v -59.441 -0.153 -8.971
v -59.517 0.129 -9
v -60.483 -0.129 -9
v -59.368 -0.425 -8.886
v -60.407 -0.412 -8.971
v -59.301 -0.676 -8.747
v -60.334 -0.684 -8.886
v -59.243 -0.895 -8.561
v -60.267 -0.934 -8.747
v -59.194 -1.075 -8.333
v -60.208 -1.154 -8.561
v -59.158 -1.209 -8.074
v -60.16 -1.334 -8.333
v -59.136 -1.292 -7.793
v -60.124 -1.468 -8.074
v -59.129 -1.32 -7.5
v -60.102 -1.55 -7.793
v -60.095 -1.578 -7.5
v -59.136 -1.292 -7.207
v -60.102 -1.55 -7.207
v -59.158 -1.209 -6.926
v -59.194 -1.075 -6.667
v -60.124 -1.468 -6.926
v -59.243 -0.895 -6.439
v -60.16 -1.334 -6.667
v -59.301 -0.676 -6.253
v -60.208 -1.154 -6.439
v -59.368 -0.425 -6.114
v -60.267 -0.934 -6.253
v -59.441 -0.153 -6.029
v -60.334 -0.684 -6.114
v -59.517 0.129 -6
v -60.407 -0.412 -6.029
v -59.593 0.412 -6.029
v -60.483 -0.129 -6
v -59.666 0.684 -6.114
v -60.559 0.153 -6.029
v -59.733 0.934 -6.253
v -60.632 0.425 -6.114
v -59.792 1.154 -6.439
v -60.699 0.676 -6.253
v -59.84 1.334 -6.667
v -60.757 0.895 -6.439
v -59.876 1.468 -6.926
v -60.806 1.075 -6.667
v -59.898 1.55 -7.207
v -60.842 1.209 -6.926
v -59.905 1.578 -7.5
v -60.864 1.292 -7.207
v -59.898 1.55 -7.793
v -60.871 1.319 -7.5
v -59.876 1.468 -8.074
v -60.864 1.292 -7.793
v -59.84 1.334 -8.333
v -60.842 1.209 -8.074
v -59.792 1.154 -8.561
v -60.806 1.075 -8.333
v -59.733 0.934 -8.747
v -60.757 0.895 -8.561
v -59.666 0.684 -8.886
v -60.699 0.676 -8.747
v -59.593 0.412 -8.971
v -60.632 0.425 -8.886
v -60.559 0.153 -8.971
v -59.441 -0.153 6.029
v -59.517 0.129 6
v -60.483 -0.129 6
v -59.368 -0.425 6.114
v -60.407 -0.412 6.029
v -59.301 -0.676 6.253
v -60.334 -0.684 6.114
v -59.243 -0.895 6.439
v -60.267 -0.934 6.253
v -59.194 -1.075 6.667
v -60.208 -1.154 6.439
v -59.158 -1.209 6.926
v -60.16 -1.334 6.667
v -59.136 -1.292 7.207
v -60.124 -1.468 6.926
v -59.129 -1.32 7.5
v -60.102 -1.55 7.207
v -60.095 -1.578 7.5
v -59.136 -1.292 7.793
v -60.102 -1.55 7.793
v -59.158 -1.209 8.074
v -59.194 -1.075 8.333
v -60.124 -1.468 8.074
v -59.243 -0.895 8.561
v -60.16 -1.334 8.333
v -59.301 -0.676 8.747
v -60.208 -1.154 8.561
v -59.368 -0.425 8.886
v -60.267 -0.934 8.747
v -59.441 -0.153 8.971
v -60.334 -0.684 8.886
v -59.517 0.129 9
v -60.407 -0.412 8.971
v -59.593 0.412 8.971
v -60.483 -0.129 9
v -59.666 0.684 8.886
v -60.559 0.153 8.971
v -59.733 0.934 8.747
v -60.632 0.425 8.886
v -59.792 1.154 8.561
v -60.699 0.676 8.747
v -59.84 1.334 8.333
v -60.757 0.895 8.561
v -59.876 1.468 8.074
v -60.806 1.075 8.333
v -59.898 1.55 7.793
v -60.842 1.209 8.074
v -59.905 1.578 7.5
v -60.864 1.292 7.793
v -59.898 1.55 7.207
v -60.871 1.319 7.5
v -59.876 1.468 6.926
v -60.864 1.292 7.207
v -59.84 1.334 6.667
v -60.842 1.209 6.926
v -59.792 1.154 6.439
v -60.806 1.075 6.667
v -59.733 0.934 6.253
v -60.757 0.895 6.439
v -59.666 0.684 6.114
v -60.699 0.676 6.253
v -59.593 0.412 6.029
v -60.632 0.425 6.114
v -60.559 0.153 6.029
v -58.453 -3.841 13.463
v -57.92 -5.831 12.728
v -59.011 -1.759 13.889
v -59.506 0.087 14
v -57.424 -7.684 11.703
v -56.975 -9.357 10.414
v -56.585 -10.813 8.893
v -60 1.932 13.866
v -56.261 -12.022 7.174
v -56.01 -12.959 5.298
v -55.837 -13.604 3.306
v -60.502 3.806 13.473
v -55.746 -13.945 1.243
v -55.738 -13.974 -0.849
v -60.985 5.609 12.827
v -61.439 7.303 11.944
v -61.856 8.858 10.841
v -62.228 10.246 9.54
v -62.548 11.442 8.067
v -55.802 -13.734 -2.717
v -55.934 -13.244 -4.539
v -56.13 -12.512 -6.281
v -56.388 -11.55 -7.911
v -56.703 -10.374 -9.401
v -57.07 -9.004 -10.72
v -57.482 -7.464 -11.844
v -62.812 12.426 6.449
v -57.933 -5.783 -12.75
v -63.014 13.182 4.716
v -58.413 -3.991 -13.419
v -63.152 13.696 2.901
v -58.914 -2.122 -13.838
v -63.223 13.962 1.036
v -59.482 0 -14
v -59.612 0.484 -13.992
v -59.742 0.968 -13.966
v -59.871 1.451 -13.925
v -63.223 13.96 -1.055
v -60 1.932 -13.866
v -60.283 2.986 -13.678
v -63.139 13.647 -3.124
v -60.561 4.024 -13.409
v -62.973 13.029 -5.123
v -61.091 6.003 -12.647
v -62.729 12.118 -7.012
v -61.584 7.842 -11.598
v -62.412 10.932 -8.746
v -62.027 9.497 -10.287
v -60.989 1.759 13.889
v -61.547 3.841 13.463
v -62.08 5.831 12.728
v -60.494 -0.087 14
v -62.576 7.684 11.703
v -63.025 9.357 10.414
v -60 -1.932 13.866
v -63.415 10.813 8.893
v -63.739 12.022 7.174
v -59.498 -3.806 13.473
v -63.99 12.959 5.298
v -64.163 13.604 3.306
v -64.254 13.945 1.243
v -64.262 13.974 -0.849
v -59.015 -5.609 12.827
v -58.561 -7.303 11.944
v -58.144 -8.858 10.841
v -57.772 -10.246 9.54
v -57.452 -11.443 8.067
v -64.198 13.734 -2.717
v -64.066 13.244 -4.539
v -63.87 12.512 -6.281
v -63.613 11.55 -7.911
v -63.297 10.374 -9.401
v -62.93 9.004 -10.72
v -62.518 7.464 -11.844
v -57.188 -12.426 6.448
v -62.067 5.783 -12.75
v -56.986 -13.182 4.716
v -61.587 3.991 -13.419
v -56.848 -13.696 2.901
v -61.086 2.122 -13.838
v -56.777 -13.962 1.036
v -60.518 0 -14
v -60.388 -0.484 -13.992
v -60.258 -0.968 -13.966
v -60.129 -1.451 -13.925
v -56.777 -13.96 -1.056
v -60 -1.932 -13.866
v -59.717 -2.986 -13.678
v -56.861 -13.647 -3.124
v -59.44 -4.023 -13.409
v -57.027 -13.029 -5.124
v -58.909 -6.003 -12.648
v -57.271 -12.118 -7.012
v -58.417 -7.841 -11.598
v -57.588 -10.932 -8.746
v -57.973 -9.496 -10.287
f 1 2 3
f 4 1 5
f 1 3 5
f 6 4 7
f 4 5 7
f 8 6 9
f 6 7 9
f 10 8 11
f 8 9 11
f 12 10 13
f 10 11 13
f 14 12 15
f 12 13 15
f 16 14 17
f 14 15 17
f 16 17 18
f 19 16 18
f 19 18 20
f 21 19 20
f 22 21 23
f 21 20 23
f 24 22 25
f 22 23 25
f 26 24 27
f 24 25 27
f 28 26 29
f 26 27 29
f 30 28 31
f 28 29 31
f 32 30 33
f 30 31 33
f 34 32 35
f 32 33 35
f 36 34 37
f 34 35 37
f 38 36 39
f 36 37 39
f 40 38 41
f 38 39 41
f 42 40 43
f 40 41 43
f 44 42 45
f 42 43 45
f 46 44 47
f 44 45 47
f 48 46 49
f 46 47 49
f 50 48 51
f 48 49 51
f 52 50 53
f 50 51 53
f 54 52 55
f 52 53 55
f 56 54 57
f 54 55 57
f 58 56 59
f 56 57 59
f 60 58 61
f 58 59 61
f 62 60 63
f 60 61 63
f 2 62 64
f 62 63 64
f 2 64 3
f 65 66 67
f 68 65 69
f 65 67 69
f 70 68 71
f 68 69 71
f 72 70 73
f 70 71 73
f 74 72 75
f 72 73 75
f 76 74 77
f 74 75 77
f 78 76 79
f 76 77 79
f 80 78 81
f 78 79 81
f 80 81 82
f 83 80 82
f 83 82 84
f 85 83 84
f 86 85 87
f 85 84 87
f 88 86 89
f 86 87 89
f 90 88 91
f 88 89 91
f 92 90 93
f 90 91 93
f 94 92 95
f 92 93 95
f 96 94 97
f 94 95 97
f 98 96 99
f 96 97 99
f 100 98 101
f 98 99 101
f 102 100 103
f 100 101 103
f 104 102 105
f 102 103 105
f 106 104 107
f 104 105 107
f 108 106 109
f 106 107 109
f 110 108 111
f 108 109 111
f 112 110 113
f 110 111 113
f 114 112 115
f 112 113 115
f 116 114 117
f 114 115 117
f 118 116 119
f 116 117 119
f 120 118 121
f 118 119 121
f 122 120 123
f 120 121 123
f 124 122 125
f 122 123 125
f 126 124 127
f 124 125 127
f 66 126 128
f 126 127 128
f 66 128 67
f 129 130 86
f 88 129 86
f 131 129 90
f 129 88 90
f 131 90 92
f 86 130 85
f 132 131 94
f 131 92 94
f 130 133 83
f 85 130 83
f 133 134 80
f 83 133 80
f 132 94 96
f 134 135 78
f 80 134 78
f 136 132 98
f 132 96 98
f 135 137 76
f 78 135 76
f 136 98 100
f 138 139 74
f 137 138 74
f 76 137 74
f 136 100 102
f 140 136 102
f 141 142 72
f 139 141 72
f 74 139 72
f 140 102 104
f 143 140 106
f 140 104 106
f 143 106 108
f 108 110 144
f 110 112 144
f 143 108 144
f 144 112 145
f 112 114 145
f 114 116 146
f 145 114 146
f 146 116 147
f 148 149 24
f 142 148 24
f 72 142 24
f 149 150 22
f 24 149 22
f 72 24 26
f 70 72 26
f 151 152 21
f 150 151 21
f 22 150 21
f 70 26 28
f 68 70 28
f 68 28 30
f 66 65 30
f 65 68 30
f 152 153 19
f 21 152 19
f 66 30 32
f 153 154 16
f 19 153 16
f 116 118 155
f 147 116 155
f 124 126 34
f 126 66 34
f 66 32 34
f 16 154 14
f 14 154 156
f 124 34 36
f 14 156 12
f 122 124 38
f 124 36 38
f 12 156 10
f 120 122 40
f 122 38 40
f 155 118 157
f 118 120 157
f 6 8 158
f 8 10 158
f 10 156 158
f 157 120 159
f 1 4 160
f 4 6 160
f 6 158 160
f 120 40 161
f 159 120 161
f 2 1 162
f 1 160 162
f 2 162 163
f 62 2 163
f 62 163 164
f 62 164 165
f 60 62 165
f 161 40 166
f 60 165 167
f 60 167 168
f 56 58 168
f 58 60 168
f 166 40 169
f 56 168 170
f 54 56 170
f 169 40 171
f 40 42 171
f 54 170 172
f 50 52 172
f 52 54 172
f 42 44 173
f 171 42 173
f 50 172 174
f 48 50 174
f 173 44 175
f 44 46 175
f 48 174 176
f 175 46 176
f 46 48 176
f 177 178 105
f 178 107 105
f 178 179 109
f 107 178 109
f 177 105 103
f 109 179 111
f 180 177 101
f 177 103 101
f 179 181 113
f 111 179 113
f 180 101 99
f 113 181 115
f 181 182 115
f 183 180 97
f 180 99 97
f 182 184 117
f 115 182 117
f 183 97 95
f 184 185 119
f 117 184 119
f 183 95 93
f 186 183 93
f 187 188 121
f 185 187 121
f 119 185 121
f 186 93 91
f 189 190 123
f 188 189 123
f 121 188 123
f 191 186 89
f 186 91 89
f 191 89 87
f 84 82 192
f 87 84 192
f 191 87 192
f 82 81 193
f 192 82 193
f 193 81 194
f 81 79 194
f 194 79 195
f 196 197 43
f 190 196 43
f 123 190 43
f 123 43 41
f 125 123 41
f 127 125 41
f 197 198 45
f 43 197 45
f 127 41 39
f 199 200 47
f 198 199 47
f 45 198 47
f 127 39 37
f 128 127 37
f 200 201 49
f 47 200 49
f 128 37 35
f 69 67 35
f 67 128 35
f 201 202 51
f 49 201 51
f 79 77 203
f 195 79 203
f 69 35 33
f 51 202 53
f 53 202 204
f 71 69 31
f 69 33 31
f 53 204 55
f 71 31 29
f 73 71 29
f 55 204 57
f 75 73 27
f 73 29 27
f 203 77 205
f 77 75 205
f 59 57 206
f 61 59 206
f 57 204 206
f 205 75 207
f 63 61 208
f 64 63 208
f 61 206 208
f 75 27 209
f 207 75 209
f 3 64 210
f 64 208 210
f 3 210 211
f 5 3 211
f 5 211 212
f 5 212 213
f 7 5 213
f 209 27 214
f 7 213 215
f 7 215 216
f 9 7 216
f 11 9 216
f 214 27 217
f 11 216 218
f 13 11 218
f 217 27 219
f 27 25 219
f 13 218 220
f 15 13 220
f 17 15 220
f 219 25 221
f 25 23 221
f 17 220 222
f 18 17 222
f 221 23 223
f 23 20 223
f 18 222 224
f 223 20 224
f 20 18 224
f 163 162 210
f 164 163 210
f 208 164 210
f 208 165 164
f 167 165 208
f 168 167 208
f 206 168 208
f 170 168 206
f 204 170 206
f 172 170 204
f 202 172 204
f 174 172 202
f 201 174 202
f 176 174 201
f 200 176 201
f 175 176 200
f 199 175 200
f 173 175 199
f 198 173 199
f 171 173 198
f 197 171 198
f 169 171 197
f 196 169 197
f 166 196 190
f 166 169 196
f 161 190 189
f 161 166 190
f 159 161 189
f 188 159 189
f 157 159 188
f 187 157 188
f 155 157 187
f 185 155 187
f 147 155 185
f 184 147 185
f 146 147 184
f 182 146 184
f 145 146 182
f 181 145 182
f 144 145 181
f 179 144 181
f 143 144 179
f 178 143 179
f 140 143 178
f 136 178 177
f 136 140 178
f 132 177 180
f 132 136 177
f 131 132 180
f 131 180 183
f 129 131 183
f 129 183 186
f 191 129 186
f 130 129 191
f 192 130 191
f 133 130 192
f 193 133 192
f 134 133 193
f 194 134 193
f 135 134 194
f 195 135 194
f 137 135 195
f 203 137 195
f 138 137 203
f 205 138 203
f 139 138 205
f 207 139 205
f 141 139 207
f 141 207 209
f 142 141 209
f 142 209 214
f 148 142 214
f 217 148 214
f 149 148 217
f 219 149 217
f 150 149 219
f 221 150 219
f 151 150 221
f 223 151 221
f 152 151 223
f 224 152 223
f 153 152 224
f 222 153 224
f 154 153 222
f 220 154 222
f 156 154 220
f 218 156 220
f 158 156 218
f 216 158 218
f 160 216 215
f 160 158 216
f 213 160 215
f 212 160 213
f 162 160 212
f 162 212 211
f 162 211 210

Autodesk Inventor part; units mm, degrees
ref_plane "YZ Plane" through (0, 0, 0) normal (1, 0, 0) x (0, 1, 0)
ref_plane "XY Plane" through (0, 0, 0) normal (0, 0, 1) x (1, 0, 0)
ref_plane "Work Plane1" through (0, 0, 0) normal (0, 0, 1) x (1, 0, 0)
sketch "Sketch1" plane through (0, 0, 0) normal (0, 0, 1) x (1, 0, 0)
  line L0 (-58.0302, -14) -> (-60.5225, -14) construction
  line L1 (-54.7493, -17.6642) -> (-59.4824, 0)
  line L2 (-65.1814, 17.4053) -> (-55.7152, -17.923)
  line L3 (-59.4824, 0) -> (-60.5176, 0) construction
  line L4 (-144, 0) -> (-60.5176, 0) construction
  line L5 (-47.8265, 0) -> (-82.556, 0) construction
  line L6 (-64.2155, 17.6642) -> (-65.1814, 17.4053)
  line L7 (-55.7152, -17.923) -> (-54.7493, -17.6642)
  line L8 (-59.4824, 0) -> (-64.2155, 17.6642)
  line L9 (-60.5176, 0) -> (24, 0) construction
  line L10 (-144, 0) -> (24, 0)
  line L11 (-60, 54.8295) -> (-60, -83.9771)
  point P0 (0, 0)
  point P1 (-60, 0)
  dimension "d2" = 1
  dimension "d28" = 17.6642
  dimension "d29" = 15
extrude "Extrusion1" add sketch "Sketch1" along normal blind 30 and the other way blind 30
ref_plane "Work Plane2" through (-60, 0, -16) normal (1, 0, 0) x (0, 0, -1)
sketch "Sketch2" plane through (-60, 0, -16) normal (1, 0, 0) x (0, 0, -1)
  circle A0 centre (-16, 0) radius 17.5
  dimension "d26" = 35
extrude "Extrusion2" cut sketch "Sketch2" along normal mid plane 30 keep common part
sketch "Sketch5" plane through (-60, 0, -16) normal (1, 0, 0) x (0, 0, -1)
  circle A0 centre (-16, 0) radius 14
  dimension "d30" = 28
extrude "Extrusion4" cut sketch "Sketch5" along normal mid plane 10 keep common part
sketch "Sketch7" plane through (-59.4824, 0, 0) normal (0.9659, 0.2588, 0) x (0, 0, -1)
  line L0 (-33.8, 0.134) -> (-42.2, 0.134) construction
  line L1 (-86, 0.134) -> (89, 0.134) construction
  line L2 (-86, 0.134) -> (89, 0.134) construction
  circle A0 centre (7.5, 0.134) radius 1.5 construction
  circle A1 centre (-7.5, 0.134) radius 1.5 construction
  line L3 (0, -21.4266) -> (0, 20.7932) construction
  point P0 (0, -15.3952)
  dimension "d34" = 3
  dimension "d35" = 7.5
  dimension "d36" = 7.5
hole "Hole2" at (-59.517, 0.1294, -7.5) at (-59.517, 0.1294, 7.5) direction (-0.9659, -0.2588, 0) diameter 3 end through all
properties part number "butterfly" material "Brass, Soft Yellow"
